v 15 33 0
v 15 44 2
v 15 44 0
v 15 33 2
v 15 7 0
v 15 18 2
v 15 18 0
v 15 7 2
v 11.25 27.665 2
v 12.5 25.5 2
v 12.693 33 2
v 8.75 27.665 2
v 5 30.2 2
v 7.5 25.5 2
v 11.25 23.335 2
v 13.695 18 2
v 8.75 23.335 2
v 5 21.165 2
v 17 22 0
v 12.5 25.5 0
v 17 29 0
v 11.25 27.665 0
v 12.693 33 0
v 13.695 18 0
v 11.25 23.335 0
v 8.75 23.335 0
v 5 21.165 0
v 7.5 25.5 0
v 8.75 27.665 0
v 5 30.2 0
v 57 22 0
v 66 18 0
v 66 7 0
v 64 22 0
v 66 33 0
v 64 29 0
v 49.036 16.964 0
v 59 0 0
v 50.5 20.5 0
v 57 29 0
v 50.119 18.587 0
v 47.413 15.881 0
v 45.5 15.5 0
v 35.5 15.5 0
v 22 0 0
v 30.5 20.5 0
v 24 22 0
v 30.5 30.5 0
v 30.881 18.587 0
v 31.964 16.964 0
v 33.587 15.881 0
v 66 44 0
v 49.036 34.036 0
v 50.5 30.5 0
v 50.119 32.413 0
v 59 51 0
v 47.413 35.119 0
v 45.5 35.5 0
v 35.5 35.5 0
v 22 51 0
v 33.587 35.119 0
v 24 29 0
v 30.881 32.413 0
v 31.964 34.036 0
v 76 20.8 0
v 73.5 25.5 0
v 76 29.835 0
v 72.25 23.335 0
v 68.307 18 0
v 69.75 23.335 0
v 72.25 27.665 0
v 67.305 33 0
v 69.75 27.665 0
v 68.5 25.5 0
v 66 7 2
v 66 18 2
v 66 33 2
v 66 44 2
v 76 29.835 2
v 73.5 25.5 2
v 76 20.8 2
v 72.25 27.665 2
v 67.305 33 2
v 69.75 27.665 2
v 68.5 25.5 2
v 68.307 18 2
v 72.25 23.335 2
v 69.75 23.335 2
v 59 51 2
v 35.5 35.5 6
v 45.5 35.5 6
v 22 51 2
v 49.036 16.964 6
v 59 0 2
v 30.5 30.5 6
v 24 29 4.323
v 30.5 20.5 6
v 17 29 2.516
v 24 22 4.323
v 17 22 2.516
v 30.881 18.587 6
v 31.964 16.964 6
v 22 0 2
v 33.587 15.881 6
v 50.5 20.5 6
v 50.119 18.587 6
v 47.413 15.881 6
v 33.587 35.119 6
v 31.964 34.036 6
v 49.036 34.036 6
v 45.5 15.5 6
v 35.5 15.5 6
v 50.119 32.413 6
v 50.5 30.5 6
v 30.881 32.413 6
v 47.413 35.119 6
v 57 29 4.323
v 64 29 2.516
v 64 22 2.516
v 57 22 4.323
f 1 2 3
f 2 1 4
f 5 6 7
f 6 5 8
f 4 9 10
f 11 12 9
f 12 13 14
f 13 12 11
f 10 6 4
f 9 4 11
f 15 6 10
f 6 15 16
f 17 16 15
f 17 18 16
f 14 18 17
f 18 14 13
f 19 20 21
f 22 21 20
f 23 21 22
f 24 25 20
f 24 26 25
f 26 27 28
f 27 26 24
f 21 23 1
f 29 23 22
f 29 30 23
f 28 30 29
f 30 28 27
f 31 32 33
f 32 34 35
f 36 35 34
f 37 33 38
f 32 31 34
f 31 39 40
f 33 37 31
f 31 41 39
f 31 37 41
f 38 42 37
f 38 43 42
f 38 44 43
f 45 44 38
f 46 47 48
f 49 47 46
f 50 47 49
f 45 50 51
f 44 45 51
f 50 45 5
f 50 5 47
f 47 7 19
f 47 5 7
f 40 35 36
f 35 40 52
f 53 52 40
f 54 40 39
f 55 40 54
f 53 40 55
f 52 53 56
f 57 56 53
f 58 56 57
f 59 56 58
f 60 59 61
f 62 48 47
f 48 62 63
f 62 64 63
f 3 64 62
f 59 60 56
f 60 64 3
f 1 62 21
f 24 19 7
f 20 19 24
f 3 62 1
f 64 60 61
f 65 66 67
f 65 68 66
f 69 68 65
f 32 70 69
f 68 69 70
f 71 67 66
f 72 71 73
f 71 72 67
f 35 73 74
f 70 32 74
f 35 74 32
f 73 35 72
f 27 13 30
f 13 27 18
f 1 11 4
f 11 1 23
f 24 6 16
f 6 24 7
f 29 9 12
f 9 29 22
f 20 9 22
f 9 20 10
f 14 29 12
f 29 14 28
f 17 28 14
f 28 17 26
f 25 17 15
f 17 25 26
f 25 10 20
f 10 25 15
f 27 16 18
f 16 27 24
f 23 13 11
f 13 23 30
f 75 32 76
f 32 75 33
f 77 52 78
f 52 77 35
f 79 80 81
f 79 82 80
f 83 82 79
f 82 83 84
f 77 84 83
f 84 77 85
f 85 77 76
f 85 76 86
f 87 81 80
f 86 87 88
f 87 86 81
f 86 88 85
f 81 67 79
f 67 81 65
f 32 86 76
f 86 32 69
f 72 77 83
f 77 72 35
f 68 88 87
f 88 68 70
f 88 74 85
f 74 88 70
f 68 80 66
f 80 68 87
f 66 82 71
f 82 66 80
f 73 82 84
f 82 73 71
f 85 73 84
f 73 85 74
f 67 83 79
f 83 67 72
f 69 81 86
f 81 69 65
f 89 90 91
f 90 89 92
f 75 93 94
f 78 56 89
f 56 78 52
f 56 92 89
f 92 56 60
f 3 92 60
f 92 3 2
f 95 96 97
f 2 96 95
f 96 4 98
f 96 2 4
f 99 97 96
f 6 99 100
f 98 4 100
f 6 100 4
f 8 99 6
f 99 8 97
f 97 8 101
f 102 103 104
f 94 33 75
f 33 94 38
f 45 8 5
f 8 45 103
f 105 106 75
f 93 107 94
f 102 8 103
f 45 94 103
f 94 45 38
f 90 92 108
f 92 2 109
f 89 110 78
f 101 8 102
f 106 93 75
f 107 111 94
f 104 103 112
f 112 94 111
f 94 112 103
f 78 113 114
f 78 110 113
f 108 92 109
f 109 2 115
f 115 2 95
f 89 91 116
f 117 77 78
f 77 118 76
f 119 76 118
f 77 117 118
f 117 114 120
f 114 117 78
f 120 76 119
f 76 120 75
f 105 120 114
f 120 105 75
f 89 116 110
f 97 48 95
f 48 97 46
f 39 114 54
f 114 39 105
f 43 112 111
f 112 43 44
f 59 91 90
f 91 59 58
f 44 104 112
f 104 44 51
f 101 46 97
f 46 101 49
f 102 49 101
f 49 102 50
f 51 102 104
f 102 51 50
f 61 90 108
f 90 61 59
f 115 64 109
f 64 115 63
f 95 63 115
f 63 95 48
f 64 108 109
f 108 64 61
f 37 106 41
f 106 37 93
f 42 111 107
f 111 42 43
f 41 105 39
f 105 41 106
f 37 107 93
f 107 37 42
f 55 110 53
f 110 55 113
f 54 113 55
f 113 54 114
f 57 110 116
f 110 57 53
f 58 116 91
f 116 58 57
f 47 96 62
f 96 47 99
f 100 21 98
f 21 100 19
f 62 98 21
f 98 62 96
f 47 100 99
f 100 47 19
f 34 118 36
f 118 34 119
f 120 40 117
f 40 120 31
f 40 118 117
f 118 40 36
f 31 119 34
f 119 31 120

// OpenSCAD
/*
 * scad/indicator_case.scad
 * Case for Indicator
 * 
*/

//Global Constants
//Cube base for the foundation of drawing fancy edged cubes
module cube_base(width, length, height, diff=5)
{
    union()
    {
        //Center Space

        translate([width/2,length/2,height/2]) 
            cube([width- 2*diff+1, length- 2*diff+1, height], center=true);
        
        //Straight Edges
        translate([0,diff,0]) cube([diff, length - 2 * diff,height]);
        translate([width-diff,diff,0]) cube([diff, length - 2 * diff,height]);
        translate([diff,0,0]) cube([width-2*diff,diff,height]);
        translate([diff,length-diff,0]) cube([width-2*diff,diff,height]);
    }
}

//Draw a cube with rounded edges
module round_edge_cube(width, length, height, radius=5)
{
    union()
    {
        cube_base(width, length, height, radius);
        
        //Circles for the rounded corners
        for(x=[radius, width-radius])
        {
            for(y=[radius, length-radius])
            {
                translate([x,y,0]) cylinder(r=radius, h=height);
            }
        }
    }
}

//Draw a cube with trianglar edges
module triangle_edge_cube(width, length, height, tsize=5)
{
    union()
    {
        cube_base(width, length, height, tsize);
        
        //Triangles for Triangluar conrners
        for(x=[tsize, width-tsize])
        {
            for(y=[tsize, length-tsize])
            {
                translate([x,y,height/2]) rotate([0,0,45])
                    cube([tsize*1.4, tsize*1.4, height], center=true);
            }
        }
    }
}

module hexagon(radius, height)
{
    cylinder(r=radius, h=height, $fn=6);
}

//Attachment 
ATTACH_RADI = 2.5;
ATTACH_ENTRENCH = 5;
ATTACH_WIDTH = 10;
ATTACH_LENGTH= 15;

module attachment(width=8, length=16, height=3)
{
    //Attachment Hole Measurement
    translate([-ATTACH_WIDTH,length/2-ATTACH_LENGTH/2,0])  
    {
        
        difference()
        {
            cube([ATTACH_WIDTH, ATTACH_LENGTH, height]);
            translate([ATTACH_WIDTH-ATTACH_ENTRENCH, ATTACH_LENGTH/2, -1]) hexagon(ATTACH_RADI, height+2);
            translate([-3,0,-1]) rotate([0,0,-20]) cube([ATTACH_WIDTH+2, ATTACH_WIDTH * 0.4, height+2]);
            translate([0,ATTACH_LENGTH-2.8,-1]) rotate([0,0,20]) cube([ATTACH_WIDTH+2, ATTACH_WIDTH * 0.4, height+2]);
        }
    }

    translate([width+ATTACH_WIDTH,length/2+ATTACH_LENGTH/2,0]) rotate([0,0,180])
    {
        difference()
        {
            cube([ATTACH_WIDTH, ATTACH_LENGTH, height]);
            translate([ATTACH_WIDTH-ATTACH_ENTRENCH, ATTACH_LENGTH/2, -1]) hexagon(ATTACH_RADI, height+2);
            translate([-3,0,-1]) rotate([0,0,-20]) cube([ATTACH_WIDTH+2, ATTACH_WIDTH * 0.4, height+2]);
            translate([0,ATTACH_LENGTH-2.8,-1]) rotate([0,0,20]) cube([ATTACH_WIDTH+2, ATTACH_WIDTH * 0.4, height+2]);
        }
    }
}

module attachment_extrusion(width=8, length=16, height=3, extrude=10)
{
    //Attacment Extrusions
    translate([-ATTACH_WIDTH,length/2-ATTACH_LENGTH/2,0])  
    {
        difference()
        {
            union()
            {
                cube([ATTACH_WIDTH, ATTACH_LENGTH, height]);
                translate([ATTACH_WIDTH-ATTACH_ENTRENCH, ATTACH_LENGTH/2, 0]) 
                hexagon(ATTACH_RADI, height+extrude);
            }
            translate([-3,0,-1]) rotate([0,0,-20]) cube([ATTACH_WIDTH+2, ATTACH_WIDTH * 0.4, height+2]);
            translate([0,ATTACH_LENGTH-2.8,-1]) rotate([0,0,20]) cube([ATTACH_WIDTH+2, ATTACH_WIDTH * 0.4, height+2]);
        }
    }

    translate([width+ATTACH_WIDTH,length/2+ATTACH_LENGTH/2,0]) rotate([0,0,180])
    {
        difference()
        {
            union()
            {
                cube([ATTACH_WIDTH, ATTACH_LENGTH, height]);
                translate([ATTACH_WIDTH-ATTACH_ENTRENCH, ATTACH_LENGTH/2, 0]) 
                hexagon(ATTACH_RADI, height+extrude);
            }
            translate([-3,0,-1]) rotate([0,0,-20]) cube([ATTACH_WIDTH+2, ATTACH_WIDTH * 0.4, height+2]);
            translate([0,ATTACH_LENGTH-2.8,-1]) rotate([0,0,20]) cube([ATTACH_WIDTH+2, ATTACH_WIDTH * 0.4, height+2]);
        }
    }
}


module top_plate()
{
    length=51; width=51; height=2;

    difference()
    {
        display_width = 20;
        display_length = 20;
        display_height = height + 6;

        union()
        {
            hull()
            {
                triangle_edge_cube(width=width, length=length, height=height, tsize=7);
                translate([width/2-display_width/2, length/2-display_width/2, height+3]) 
                    round_edge_cube(width=display_width, length=display_length, height=1, radius=5); 
            }
            attachment(width=width, length=length, height=height);
        }
    
        //Display Hole
        translate([width/2-display_width/2, length/2-display_length/2, -1])
            round_edge_cube(width=display_width, length=display_length, height=display_height, radius=5); 
        
        //Button Holes
        button_length = 7;
        disp_button_distance = 7;
        translate([2,length/2 - button_length/2,-1]) 
            cube([button_length, button_length, height+5]);
        
        disp_button_distance = 7;
        translate([width- button_length- 2,length/2 - button_length/2,-1]) 
            cube([button_length, button_length, height+5]);
        
    }
}

module mid_plate()
{
    width=51; length=40; height=5;
    difference()
    {
        union()
        {
            triangle_edge_cube(width=width, length=length, height=height, tsize=6);
            translate([14,6.5,height]) cylinder(r=2,h=2);
            translate([width-14,6.5,height]) cylinder(r=2,h=2);

            attachment(width=width, length=length, height=height);
        }
        
        //Ports Hole
        translate([-1,length-8,-1]) cube([30+1,8+1,height+2]);
        
        //Battery Crevice
        translate([-0.5,0-1,-1]) cube([width+1,25+1,1+1]);
    }
}

module bottom_plate()
{
    width=51; length=55; height=5;
    
    difference()
    {
        union()
        {
            triangle_edge_cube(width=width, length=length, height=height, tsize=4);
            attachment_extrusion(width=width, length=length, height=height, extrude=20);
            
            //Corners of Battery Holder
            translate([-5,0,0]) cube([5,width/2,height]);
            translate([0,0,0]) cube([5,5,height]);
            translate([width,0,0]) cube([5,width/2,height]);
            translate([width-5,,0]) cube([5,5,height]);
        
            //Cable Management
            guide_height= 3;
            translate([0,0,height])
            {
                difference()
                {
                    triangle_edge_cube(width=width, length=length, height=guide_height, tsize=4);
                    translate([-0.05,-0.05,-0.05]) cube([width+0.1,length/2+0.1,guide_height+0.1]);
                    translate([2,0,0]) 
                        round_edge_cube(width=width-4, length=length-2, height=guide_height+1, radius=4);
                    translate([width/2-4, length-2-1,0]) cube([8,2+2,guide_height+1]);
                }
            }
        }
        //Battery Hole
        translate([-0.5,5-1,-1]) cube([width+1,25+1,height+10]);
    }
}

translate([15,0,0])
{
    //translate([0,0,0]) top_plate();
    //translate([80,0.0]) mid_plate();
    //translate([0,60,0]) bottom_plate();
}
translate([15,0,0]) top_plate();
